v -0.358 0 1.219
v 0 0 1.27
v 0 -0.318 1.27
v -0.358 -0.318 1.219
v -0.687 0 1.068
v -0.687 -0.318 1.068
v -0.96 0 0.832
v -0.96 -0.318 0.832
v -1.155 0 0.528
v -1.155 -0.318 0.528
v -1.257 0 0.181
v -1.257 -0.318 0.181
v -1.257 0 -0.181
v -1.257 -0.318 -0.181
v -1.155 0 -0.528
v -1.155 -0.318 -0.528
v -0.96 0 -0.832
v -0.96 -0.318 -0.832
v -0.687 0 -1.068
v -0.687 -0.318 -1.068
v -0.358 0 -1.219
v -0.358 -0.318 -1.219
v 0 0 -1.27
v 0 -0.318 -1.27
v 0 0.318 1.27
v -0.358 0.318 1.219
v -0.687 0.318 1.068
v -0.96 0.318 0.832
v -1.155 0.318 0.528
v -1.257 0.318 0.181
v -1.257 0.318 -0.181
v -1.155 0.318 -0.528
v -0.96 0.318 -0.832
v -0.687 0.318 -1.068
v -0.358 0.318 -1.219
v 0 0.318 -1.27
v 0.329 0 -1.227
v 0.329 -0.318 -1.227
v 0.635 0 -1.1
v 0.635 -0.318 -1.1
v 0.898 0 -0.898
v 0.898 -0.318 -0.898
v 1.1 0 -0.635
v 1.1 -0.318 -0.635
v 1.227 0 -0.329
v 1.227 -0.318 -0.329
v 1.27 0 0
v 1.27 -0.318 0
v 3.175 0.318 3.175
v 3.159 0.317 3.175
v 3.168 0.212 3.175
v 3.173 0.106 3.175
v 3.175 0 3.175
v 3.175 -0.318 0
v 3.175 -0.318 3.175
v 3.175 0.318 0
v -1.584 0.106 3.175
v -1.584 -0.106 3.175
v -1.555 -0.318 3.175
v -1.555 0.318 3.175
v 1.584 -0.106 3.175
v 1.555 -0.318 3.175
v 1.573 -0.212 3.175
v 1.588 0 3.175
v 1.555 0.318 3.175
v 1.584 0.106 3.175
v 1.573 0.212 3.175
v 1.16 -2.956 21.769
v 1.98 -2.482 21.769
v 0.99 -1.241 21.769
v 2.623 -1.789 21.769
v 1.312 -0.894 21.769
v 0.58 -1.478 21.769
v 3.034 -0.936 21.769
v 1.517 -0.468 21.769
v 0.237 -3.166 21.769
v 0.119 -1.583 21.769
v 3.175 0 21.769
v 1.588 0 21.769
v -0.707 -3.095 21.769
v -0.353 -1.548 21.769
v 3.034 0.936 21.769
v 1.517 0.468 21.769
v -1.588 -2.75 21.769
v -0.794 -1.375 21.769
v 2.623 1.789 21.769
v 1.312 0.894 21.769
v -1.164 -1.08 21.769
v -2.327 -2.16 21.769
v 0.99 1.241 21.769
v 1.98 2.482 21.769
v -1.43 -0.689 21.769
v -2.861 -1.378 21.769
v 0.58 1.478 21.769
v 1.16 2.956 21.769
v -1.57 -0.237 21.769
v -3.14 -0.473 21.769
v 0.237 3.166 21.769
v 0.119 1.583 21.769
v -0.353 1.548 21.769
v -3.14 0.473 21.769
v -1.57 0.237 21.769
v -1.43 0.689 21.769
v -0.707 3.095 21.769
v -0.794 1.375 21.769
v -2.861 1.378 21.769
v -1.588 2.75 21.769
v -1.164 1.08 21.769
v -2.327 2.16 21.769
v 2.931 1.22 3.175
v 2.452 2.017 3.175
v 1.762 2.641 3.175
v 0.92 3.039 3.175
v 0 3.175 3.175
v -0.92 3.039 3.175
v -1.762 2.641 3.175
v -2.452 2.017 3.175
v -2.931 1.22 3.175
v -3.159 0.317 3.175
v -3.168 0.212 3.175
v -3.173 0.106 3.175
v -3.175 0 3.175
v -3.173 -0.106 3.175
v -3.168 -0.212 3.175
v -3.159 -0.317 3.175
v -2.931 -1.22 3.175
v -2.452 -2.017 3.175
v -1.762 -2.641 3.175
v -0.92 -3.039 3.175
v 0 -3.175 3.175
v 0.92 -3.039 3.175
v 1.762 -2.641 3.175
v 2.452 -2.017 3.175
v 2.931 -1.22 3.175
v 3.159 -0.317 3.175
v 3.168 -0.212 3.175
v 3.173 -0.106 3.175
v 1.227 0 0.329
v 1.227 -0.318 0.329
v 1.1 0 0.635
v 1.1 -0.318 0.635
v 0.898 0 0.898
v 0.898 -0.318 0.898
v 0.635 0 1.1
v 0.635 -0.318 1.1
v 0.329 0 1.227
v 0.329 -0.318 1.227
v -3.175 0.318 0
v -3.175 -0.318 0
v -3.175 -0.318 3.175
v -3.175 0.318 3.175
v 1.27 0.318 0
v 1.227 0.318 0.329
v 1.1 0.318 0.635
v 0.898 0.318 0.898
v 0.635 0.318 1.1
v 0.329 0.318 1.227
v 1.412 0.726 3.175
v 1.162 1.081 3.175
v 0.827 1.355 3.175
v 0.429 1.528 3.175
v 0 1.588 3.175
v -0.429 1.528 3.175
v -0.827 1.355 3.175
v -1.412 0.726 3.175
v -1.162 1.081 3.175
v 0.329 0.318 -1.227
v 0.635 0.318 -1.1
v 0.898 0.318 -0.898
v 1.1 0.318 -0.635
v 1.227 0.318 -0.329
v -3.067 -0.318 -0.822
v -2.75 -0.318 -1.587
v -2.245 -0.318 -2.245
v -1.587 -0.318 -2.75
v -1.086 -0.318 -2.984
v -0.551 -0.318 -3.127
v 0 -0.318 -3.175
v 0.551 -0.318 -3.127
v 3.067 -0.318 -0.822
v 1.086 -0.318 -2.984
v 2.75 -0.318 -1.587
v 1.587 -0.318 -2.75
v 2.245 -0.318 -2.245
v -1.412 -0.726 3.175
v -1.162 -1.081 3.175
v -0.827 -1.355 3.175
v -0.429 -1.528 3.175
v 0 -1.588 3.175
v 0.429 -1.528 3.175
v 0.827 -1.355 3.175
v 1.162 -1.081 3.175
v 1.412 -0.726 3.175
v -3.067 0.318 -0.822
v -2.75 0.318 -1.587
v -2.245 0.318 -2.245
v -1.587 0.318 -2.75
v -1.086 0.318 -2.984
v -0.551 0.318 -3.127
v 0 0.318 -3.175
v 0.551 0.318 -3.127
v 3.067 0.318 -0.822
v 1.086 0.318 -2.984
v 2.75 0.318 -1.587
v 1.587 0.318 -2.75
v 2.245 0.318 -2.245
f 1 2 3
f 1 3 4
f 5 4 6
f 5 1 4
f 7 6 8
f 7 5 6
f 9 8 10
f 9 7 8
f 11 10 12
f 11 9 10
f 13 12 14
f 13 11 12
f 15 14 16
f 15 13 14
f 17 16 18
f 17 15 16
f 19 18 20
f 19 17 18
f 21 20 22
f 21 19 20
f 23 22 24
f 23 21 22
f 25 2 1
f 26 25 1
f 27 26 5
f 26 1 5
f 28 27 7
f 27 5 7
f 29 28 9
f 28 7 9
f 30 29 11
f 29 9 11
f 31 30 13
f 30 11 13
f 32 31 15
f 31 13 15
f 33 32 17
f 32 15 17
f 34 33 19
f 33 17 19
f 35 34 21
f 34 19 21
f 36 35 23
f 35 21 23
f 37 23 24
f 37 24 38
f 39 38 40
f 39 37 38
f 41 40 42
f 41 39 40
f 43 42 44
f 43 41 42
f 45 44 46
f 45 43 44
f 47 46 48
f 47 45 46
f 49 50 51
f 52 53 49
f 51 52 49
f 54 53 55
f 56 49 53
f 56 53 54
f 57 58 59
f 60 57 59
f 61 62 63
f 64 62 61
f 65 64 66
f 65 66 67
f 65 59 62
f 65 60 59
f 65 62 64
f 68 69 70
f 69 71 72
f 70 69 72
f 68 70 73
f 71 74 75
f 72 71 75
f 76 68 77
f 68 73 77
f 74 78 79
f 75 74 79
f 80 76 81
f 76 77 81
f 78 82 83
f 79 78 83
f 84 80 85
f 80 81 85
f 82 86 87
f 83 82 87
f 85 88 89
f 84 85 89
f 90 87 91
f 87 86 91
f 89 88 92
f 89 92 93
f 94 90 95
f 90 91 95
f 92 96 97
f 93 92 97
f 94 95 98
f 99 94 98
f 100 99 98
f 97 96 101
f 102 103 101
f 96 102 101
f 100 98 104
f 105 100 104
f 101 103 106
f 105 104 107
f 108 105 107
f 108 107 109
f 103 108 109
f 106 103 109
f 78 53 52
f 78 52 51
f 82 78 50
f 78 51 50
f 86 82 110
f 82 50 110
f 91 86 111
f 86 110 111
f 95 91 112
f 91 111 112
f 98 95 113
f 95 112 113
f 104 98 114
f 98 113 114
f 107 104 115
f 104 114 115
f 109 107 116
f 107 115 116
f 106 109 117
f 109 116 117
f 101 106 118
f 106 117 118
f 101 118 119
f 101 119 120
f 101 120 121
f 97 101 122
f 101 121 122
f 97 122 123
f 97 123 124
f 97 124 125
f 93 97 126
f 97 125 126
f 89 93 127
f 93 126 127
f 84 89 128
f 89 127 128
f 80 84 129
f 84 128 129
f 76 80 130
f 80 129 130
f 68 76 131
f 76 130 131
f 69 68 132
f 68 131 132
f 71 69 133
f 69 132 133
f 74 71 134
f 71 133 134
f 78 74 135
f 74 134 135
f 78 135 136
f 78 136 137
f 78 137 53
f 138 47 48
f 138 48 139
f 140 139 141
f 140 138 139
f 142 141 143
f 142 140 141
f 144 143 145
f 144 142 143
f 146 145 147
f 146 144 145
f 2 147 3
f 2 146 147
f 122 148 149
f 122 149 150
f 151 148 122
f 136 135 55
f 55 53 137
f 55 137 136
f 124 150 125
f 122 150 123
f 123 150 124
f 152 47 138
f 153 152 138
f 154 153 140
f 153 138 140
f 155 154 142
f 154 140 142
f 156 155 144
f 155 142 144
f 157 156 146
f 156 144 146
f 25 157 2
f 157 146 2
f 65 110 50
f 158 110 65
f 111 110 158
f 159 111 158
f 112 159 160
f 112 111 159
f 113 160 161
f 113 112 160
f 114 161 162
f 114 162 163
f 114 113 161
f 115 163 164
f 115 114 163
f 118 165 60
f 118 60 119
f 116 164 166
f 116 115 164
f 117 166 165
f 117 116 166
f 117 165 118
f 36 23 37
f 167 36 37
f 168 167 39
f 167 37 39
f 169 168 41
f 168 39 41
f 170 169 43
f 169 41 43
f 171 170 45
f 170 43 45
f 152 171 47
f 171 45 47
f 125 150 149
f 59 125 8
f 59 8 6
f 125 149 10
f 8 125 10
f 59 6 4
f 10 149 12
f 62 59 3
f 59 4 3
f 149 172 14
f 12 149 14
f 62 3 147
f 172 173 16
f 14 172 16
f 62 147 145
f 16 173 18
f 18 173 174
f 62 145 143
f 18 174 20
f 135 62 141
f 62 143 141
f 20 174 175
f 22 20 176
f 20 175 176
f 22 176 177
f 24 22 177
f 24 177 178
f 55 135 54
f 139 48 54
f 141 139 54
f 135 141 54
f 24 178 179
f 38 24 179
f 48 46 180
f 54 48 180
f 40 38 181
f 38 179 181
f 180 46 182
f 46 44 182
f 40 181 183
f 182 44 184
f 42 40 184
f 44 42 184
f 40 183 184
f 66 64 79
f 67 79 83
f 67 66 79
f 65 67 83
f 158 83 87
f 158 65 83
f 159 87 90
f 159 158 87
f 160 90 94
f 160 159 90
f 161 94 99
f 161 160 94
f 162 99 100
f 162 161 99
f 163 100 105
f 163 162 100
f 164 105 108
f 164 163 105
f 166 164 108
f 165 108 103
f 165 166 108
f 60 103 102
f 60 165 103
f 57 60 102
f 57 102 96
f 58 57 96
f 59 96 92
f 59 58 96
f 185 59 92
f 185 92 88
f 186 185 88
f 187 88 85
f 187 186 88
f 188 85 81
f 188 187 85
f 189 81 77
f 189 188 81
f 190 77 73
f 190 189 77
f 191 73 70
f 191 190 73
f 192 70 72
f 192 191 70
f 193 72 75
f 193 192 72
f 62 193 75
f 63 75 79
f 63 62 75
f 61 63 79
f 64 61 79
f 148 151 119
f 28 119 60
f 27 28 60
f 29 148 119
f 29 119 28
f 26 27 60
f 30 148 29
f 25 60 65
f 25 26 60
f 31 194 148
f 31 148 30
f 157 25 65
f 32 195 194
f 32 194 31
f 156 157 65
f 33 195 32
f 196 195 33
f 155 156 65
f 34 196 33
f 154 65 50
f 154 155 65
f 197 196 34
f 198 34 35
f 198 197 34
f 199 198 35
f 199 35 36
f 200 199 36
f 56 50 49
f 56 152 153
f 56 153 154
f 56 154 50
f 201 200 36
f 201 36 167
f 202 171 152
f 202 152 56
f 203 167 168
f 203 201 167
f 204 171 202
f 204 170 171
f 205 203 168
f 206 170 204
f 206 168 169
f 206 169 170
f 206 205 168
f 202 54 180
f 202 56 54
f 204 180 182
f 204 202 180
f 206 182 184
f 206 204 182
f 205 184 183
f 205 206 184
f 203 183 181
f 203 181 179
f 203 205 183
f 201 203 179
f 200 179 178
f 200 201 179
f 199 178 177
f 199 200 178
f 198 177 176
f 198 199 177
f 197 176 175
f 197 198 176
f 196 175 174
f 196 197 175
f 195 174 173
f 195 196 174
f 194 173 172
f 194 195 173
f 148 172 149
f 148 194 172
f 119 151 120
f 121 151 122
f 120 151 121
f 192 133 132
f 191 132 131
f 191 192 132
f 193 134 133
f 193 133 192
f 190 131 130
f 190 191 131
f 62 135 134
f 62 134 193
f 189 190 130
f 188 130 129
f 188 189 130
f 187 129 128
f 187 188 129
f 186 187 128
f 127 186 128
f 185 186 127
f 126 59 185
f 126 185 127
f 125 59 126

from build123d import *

# Parameters (mm, degrees)
SKETCH1_W                = 1.5875
SKETCH1_H                = 18.594090574
BOSS_EXTRUDE1_DEPTH      = 0.3175
BOSS_EXTRUDE1_DEPTH_BACK = 0.3175
SKETCH1_10_R             = 1.27


with BuildPart() as part:
    # Sketch1 → Revolve6 (revolve)
    with BuildSketch(Plane(origin=(0, 0, 0), x_dir=(1, 0, 0), z_dir=(0, 1, 0))):
        with Locations((-2.38125, -12.472045287)):
            Rectangle(SKETCH1_W, SKETCH1_H)
    revolve(axis=Axis((0, 0, 0), (0, 0, 1)))

    # Sketch1<10> → Boss-Extrude1 (add, two sides: drawn at the far end of the back side and taken through both)
    with BuildSketch(Plane(origin=(0, 0, 0), x_dir=(1, 0, 0), z_dir=(0, 1, 0)).offset(-BOSS_EXTRUDE1_DEPTH_BACK)):
        with BuildLine():
            Line((3.175, -3.175), (3.175, 0))
            ThreePointArc((3.175, 0), (0, 3.175), (-3.175, 0))
            Line((-3.175, 0), (-3.175, -3.175))
            Line((-3.175, -3.175), (3.175, -3.175))
        make_face()
        Circle(SKETCH1_10_R, mode=Mode.SUBTRACT)
    extrude(amount=BOSS_EXTRUDE1_DEPTH + BOSS_EXTRUDE1_DEPTH_BACK)


solid = part.part
